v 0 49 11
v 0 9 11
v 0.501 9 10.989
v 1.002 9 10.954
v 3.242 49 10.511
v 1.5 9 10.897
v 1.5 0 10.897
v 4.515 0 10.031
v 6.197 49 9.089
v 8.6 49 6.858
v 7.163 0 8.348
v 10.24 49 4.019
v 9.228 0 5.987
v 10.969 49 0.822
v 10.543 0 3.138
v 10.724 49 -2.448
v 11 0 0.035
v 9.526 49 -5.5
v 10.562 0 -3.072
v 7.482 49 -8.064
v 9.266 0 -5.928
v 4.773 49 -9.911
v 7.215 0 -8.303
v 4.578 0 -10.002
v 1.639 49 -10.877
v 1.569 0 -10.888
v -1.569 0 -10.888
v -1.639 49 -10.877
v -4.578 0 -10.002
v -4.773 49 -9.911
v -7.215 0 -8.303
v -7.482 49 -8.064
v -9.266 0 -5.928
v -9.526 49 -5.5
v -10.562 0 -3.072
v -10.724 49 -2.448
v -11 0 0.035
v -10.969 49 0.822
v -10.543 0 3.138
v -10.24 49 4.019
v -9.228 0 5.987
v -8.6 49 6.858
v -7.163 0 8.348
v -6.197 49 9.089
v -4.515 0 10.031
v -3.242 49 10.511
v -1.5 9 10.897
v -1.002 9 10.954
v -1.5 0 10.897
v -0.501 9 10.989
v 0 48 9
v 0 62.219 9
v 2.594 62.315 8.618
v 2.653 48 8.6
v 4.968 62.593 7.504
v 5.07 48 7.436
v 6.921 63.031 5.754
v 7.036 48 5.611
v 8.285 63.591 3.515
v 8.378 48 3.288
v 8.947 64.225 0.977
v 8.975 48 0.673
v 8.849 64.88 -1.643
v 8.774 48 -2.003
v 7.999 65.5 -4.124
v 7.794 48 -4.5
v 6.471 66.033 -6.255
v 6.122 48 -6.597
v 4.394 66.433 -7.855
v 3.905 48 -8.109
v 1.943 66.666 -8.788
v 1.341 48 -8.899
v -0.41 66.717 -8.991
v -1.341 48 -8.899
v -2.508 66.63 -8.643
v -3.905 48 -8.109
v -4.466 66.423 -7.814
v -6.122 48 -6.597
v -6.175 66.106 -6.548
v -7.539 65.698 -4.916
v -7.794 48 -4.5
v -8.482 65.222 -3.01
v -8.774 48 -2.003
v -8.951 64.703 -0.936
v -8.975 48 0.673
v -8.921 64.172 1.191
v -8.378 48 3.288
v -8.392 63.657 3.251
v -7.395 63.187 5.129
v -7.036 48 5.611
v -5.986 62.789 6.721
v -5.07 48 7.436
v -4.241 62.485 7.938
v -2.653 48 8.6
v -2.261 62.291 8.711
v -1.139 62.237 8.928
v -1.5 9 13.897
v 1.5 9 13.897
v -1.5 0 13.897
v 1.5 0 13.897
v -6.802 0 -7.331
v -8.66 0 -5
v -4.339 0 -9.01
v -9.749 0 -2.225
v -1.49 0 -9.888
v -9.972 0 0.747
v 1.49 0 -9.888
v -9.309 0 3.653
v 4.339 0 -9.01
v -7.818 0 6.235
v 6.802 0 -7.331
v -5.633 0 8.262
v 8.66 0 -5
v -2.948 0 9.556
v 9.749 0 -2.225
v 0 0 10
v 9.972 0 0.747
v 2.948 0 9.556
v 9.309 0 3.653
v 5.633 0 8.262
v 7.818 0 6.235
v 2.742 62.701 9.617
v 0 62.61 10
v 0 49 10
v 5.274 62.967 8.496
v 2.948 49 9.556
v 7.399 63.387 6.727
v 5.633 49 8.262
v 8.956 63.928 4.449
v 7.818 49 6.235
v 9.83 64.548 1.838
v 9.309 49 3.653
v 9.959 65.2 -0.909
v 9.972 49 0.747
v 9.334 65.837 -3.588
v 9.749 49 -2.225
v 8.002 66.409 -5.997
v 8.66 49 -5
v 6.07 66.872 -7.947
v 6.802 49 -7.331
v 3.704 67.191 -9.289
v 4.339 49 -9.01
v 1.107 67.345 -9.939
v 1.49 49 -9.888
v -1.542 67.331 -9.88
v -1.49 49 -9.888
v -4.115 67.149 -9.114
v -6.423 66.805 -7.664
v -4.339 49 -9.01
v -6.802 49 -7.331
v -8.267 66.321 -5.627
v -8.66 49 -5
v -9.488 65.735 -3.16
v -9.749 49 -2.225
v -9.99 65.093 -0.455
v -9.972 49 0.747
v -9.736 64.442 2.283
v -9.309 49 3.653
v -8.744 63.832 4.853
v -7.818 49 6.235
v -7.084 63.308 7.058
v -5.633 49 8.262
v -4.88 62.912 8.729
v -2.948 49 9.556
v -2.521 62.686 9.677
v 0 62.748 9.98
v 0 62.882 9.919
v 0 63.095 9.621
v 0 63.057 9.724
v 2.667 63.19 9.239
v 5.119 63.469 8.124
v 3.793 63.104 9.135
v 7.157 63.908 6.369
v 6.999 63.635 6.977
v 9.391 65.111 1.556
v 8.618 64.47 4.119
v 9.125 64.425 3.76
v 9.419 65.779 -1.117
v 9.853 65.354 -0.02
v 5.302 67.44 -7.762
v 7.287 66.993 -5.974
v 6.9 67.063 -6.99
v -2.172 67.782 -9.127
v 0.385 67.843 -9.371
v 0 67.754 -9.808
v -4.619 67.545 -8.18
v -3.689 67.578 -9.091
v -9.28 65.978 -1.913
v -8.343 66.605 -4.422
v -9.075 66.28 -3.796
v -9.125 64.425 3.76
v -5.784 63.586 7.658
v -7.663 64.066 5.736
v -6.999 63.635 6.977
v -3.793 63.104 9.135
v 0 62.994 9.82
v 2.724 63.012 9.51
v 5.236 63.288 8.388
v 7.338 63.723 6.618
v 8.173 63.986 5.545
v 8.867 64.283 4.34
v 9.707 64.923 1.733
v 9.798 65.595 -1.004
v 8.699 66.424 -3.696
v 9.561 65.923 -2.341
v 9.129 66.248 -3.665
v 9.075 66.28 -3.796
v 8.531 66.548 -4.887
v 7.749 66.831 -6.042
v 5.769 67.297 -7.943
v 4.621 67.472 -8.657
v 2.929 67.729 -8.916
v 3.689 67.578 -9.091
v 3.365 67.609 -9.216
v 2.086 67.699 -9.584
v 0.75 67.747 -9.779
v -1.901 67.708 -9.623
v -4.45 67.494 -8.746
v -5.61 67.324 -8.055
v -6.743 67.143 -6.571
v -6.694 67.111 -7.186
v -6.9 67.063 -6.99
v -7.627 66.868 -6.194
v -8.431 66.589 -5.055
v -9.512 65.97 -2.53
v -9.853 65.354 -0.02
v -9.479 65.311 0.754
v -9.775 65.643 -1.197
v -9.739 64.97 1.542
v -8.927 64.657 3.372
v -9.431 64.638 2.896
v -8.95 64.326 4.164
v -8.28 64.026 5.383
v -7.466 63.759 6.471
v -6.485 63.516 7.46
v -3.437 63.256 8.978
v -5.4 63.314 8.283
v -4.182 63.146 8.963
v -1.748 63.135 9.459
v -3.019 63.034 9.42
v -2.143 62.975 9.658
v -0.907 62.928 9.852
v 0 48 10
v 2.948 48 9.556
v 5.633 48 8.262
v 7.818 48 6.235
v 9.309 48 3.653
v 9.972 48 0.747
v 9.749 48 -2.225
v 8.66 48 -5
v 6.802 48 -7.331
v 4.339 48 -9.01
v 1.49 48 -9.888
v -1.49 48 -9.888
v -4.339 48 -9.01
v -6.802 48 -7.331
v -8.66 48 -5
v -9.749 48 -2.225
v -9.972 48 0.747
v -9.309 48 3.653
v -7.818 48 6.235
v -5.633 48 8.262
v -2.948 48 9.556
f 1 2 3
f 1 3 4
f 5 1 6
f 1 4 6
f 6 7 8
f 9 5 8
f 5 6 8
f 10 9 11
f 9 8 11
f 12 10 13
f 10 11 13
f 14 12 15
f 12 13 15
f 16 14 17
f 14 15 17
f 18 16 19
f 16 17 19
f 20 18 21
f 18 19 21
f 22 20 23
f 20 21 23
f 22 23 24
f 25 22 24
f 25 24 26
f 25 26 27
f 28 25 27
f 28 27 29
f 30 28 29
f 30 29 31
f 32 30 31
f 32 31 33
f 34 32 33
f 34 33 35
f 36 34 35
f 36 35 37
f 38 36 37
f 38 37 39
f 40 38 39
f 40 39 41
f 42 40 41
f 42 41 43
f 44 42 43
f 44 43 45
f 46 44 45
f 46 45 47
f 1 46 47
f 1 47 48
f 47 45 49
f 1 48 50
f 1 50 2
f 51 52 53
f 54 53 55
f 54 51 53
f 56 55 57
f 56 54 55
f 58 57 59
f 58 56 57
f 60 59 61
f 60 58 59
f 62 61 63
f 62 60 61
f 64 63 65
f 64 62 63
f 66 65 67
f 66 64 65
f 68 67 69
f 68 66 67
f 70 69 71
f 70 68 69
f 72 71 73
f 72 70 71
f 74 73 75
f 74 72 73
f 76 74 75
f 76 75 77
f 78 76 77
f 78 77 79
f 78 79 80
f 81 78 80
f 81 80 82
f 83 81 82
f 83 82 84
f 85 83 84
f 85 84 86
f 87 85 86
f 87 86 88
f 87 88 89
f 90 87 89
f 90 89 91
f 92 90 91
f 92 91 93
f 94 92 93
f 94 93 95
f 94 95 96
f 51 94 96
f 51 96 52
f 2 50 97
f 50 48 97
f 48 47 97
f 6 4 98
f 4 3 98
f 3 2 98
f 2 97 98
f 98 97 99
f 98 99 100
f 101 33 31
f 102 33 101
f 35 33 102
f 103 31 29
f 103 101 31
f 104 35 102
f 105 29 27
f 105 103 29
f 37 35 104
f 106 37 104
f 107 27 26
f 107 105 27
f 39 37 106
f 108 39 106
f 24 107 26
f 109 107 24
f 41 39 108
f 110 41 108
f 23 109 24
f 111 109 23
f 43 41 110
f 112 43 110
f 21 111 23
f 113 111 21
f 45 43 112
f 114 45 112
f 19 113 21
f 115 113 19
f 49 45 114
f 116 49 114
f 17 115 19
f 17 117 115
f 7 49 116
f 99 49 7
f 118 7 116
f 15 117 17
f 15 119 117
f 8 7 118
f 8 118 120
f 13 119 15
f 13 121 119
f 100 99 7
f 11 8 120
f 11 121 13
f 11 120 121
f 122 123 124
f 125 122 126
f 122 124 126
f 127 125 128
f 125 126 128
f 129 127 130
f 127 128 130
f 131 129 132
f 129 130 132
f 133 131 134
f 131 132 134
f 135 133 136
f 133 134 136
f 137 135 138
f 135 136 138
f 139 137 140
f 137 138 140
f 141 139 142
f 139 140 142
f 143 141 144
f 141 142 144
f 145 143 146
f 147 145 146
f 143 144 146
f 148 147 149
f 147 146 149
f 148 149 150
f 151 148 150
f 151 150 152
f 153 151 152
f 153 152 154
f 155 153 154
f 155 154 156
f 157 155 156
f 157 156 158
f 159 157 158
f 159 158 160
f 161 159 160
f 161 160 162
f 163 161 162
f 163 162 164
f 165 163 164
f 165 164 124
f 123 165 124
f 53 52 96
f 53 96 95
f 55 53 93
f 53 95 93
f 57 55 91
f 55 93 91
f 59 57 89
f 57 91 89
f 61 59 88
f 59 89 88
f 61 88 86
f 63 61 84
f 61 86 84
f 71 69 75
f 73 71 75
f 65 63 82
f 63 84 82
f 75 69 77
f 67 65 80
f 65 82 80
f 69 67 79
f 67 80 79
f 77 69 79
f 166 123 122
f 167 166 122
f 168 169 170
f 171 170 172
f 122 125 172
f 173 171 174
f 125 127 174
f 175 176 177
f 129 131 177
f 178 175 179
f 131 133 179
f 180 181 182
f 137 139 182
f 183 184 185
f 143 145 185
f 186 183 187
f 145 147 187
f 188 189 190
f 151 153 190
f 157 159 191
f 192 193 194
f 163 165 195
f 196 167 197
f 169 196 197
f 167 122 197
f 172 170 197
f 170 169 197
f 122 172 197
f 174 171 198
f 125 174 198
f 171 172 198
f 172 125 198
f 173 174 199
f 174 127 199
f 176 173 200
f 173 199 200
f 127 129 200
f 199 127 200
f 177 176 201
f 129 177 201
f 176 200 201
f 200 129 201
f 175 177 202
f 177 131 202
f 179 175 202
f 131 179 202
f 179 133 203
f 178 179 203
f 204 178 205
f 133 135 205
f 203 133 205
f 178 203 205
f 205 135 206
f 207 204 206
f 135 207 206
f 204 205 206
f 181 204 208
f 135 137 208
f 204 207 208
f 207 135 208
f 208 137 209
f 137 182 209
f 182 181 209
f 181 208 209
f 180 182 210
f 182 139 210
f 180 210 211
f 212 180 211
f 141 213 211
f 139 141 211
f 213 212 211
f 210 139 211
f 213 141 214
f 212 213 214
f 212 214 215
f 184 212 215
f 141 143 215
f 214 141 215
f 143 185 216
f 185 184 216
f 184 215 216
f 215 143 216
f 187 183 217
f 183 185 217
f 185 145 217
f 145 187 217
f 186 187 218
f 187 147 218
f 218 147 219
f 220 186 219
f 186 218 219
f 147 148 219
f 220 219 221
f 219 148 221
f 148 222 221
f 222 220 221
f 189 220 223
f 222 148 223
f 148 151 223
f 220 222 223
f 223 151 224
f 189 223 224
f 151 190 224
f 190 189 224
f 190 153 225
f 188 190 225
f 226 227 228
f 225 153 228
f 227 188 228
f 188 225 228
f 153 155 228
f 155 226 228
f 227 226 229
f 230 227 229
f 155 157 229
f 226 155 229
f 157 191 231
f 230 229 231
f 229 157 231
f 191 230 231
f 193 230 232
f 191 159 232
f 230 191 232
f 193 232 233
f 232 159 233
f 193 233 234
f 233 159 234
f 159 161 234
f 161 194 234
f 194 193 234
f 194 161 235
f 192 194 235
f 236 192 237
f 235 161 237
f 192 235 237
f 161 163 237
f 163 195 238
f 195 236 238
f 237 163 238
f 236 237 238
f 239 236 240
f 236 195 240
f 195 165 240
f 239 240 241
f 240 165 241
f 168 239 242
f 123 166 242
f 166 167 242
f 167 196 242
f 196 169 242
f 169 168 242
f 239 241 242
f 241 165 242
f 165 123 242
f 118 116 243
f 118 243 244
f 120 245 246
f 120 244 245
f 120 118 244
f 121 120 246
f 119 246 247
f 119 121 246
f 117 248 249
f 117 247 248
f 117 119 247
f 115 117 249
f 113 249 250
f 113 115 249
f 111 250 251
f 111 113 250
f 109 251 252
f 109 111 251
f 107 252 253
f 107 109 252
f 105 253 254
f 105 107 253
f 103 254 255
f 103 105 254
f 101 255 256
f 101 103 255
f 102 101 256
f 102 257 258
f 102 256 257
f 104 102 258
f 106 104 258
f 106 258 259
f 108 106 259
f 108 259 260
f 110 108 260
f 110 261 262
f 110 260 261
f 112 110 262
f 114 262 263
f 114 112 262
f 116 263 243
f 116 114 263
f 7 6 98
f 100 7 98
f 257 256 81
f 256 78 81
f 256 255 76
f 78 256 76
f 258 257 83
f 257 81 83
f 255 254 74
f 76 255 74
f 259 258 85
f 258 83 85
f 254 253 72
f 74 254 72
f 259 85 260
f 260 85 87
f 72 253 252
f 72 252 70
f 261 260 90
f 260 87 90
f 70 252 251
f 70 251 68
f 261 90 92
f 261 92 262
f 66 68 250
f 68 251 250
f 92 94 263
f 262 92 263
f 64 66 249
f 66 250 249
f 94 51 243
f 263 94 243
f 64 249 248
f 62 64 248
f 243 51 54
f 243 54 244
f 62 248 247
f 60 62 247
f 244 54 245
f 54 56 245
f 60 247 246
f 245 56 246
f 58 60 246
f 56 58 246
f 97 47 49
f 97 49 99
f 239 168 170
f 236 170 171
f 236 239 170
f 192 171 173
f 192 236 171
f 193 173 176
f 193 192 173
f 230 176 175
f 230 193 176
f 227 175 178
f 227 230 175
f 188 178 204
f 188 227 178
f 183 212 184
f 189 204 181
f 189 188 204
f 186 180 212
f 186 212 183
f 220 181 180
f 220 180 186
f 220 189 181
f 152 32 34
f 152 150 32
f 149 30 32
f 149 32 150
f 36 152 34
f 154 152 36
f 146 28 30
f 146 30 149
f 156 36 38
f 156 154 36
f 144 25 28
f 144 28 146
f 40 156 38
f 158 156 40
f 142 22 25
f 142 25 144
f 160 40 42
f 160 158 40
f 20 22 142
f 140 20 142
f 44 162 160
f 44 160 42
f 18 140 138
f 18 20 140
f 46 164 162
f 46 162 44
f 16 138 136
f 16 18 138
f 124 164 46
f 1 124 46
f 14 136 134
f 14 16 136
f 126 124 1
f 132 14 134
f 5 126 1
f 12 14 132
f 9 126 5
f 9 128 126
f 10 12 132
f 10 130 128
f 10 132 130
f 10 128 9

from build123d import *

# Parameters (mm, degrees)
SKETCH_1_R               = 11
EXTRUDE_1_DEPTH          = 68
CUT_EXTRUDE_START        = -19
SKETCH_2_R               = 11
SKETCH_2_R_2             = 10
CUT_EXTRUDE_1_DEPTH      = 19
CUT_EXTRUDE_2_DEPTH      = 70.756720106
CUT_EXTRUDE_2_DEPTH_BACK = 70.756720106
FILLET_1_R               = 0.5
SHELL_2_T                = -1
SKETCH_5_W               = 3
SKETCH_5_H               = 3
EXTRUDE_2_DEPTH          = 9


with BuildPart() as part:
    # ｽｹｯﾁ1 → ﾎﾞｽ - 押し出し1 (new body)
    with BuildSketch(Plane(origin=(0, 0, 0), x_dir=(1, 0, 0), z_dir=(0, 1, 0))):
        Circle(SKETCH_1_R)
    extrude(amount=EXTRUDE_1_DEPTH)

    # ｽｹｯﾁ2 → ｶｯﾄ - 押し出し1 (cut)
    with BuildSketch(Plane(origin=(0, 68, 0), x_dir=(1, 0, 0), z_dir=(0, 1, 0)).offset(CUT_EXTRUDE_START)):
        Circle(SKETCH_2_R)
        Circle(SKETCH_2_R_2, mode=Mode.SUBTRACT)
    extrude(amount=CUT_EXTRUDE_1_DEPTH, mode=Mode.SUBTRACT)

    # ｽｹｯﾁ3 → ｶｯﾄ - 押し出し2 (cut, two sides: drawn at the far end of the back side and taken through both)
    with BuildSketch(Plane(origin=(0, 0, 0), x_dir=(0, 0, -1), z_dir=(1, 0, 0)).offset(-CUT_EXTRUDE_2_DEPTH_BACK)):
        Polygon((-10, 63), (10, 68), (-10, 68), align=None)
    extrude(amount=CUT_EXTRUDE_2_DEPTH + CUT_EXTRUDE_2_DEPTH_BACK, mode=Mode.SUBTRACT)

    # ﾌｨﾚｯﾄ1
    fillet_1_edges = [part.edges().sort_by_distance(p)[0] for p in [
        (-10, 65.500000009, -3.7e-08),
    ]]
    fillet(fillet_1_edges, radius=FILLET_1_R)

    # ｼｪﾙ2
    shell_2_openings = [part.faces().sort_by_distance(p)[0] for p in [
        (0, 0, 0),
    ]]
    offset(amount=SHELL_2_T, openings=shell_2_openings, kind=Kind.INTERSECTION)

    # ｽｹｯﾁ5 → ﾎﾞｽ - 押し出し2 (add)
    with BuildSketch(Plane.XZ):
        with Locations((0, 12.397247359)):
            Rectangle(SKETCH_5_W, SKETCH_5_H)
    extrude(amount=-EXTRUDE_2_DEPTH)


solid = part.part
